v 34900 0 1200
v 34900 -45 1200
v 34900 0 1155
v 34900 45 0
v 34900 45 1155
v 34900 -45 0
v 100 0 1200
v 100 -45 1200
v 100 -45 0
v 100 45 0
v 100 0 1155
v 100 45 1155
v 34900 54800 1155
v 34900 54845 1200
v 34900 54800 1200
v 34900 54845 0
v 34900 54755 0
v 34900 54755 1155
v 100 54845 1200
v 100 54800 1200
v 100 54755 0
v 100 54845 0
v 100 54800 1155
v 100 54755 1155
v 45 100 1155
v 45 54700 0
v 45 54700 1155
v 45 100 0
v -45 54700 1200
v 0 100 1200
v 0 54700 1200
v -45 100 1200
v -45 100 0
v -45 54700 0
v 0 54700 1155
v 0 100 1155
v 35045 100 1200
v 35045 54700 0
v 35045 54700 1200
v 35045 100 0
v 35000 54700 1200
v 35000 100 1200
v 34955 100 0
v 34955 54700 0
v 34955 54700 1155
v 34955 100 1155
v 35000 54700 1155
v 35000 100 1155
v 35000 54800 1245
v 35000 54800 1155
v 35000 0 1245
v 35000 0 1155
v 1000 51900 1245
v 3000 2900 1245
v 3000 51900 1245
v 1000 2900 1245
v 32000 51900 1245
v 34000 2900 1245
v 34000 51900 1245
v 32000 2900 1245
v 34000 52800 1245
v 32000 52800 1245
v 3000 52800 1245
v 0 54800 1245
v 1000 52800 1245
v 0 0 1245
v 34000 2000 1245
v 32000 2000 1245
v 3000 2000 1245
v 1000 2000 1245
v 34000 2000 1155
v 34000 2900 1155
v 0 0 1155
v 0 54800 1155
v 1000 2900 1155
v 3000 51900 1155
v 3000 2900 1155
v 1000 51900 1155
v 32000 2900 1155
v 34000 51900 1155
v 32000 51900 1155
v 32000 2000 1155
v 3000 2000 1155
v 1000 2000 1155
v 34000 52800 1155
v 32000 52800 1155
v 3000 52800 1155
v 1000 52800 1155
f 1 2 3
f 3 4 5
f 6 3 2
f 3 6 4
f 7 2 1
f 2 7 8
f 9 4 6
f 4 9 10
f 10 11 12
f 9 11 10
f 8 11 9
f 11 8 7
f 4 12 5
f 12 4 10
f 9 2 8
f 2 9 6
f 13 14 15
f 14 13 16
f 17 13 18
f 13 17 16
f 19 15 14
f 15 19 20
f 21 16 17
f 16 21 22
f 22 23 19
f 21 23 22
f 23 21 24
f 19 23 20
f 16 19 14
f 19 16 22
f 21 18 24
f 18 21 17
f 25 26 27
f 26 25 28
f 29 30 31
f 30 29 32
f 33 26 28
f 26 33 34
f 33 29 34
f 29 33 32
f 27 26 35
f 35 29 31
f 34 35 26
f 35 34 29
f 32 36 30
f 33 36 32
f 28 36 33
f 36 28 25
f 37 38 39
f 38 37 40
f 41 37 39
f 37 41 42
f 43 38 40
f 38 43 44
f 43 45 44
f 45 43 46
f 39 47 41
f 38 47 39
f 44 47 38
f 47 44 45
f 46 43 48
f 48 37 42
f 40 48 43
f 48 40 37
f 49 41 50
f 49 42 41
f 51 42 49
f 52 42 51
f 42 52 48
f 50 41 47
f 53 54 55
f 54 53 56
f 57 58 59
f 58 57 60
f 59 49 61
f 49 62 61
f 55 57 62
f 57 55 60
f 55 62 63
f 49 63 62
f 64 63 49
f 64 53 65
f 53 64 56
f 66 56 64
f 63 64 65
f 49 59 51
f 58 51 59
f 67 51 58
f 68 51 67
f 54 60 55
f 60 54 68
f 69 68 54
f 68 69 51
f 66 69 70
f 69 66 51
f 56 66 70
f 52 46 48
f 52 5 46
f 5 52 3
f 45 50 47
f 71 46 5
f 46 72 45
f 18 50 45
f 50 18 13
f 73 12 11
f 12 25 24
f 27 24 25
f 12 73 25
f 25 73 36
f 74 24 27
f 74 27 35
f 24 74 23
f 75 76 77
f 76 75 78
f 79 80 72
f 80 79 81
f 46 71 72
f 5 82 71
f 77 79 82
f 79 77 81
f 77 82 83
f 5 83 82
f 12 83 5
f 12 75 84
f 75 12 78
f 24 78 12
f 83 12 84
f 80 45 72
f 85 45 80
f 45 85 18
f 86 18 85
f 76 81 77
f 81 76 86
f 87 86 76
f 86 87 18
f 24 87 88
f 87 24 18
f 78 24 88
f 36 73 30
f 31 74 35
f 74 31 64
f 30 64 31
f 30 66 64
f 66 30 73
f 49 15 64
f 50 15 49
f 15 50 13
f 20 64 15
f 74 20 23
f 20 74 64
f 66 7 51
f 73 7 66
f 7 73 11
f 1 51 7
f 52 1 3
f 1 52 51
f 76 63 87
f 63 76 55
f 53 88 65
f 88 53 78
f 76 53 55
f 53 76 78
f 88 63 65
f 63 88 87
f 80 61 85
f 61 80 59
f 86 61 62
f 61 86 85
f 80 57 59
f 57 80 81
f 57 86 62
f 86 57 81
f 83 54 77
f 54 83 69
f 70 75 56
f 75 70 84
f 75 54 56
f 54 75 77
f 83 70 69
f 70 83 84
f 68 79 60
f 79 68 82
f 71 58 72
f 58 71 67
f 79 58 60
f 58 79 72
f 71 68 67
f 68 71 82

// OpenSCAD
// file: ../common/holes.scad
module countersunk_hole(h, d, r_inner, r_outer, center=true) {
  centroid = center ? [0, 0, 0] : [r_outer, r_outer, h / 2];
  translate(centroid) {
    translate([0, 0, (h - d) / 2]) cylinder(r=r_outer, h=d + 1, center=true);
    cylinder(r=r_inner, h=h + 1, center=true);
  }
}

module circle_mount(r_mount, r_hole, h) {
  translate([0, r_mount, 0]) cylinder(r=r_hole, h=h + 1, center=true);
  translate([0, -r_mount, 0]) cylinder(r=r_hole, h=h + 1, center=true);
  translate([r_mount, 0, 0]) cylinder(r=r_hole, h=h + 1, center=true);
  translate([-r_mount, 0, 0]) cylinder(r=r_hole, h=h + 1, center=true);
}

module square_mount(r_mount, r_hole, h) {
  translate([r_mount, r_mount, 0]) cylinder(r=r_hole, h=h + 1, center=true);
  translate([r_mount, -r_mount, 0]) cylinder(r=r_hole, h=h + 1, center=true);
  translate([-r_mount, r_mount, 0]) cylinder(r=r_hole, h=h + 1, center=true);
  translate([-r_mount, -r_mount, 0]) cylinder(r=r_hole, h=h + 1, center=true);
}

module mirror_drilling(axis=[1, 0, 0]) {
  children();
  mirror(axis) children();
}

module quad_drilling(axis=[0, 0, 1]) {
  children();
  mirror([1, 0, 0]) children();
  mirror(axis) {
    children();
    mirror([1, 0, 0]) children();
  }
}
// main file
use <../common/holes.scad>;

function W_BACKPLATE() = 35000;
function L_BACKPLATE() = 54800;
function H_BACKPLATE() = 1200;

module Backplate(w=W_BACKPLATE(), l=L_BACKPLATE(), h=H_BACKPLATE(), center=false) {
  d_metal = 90;
  w_gap = 200;

  centroid = center ? [0, 0, 0] : [w/2, l/2, h];
  translate(centroid) difference() {
    union() {
      cube([w, l, d_metal], center=true);
      translate([0, 0, -h/2]) {
        translate([0, -l/2, 0]) cube([w - w_gap, d_metal, h], center=true);
        translate([0, l/2, 0]) cube([w - w_gap, d_metal, h], center=true);
        translate([-w/2, 0, 0]) cube([d_metal, l - w_gap, h], center=true);
        translate([w/2, 0, 0]) cube([d_metal, l - w_gap, h], center=true);
      }
    }

    w_cutout = 2000;
    l_cutout = 900;
    quad_drilling([0, 1, 0]) translate([-(w - w_cutout)/2 + 1000, -(l - l_cutout)/2 + 2000, 0]) {
      cube([w_cutout, l_cutout, d_metal + 10], center=true);
    }
  }
}

Backplate();
